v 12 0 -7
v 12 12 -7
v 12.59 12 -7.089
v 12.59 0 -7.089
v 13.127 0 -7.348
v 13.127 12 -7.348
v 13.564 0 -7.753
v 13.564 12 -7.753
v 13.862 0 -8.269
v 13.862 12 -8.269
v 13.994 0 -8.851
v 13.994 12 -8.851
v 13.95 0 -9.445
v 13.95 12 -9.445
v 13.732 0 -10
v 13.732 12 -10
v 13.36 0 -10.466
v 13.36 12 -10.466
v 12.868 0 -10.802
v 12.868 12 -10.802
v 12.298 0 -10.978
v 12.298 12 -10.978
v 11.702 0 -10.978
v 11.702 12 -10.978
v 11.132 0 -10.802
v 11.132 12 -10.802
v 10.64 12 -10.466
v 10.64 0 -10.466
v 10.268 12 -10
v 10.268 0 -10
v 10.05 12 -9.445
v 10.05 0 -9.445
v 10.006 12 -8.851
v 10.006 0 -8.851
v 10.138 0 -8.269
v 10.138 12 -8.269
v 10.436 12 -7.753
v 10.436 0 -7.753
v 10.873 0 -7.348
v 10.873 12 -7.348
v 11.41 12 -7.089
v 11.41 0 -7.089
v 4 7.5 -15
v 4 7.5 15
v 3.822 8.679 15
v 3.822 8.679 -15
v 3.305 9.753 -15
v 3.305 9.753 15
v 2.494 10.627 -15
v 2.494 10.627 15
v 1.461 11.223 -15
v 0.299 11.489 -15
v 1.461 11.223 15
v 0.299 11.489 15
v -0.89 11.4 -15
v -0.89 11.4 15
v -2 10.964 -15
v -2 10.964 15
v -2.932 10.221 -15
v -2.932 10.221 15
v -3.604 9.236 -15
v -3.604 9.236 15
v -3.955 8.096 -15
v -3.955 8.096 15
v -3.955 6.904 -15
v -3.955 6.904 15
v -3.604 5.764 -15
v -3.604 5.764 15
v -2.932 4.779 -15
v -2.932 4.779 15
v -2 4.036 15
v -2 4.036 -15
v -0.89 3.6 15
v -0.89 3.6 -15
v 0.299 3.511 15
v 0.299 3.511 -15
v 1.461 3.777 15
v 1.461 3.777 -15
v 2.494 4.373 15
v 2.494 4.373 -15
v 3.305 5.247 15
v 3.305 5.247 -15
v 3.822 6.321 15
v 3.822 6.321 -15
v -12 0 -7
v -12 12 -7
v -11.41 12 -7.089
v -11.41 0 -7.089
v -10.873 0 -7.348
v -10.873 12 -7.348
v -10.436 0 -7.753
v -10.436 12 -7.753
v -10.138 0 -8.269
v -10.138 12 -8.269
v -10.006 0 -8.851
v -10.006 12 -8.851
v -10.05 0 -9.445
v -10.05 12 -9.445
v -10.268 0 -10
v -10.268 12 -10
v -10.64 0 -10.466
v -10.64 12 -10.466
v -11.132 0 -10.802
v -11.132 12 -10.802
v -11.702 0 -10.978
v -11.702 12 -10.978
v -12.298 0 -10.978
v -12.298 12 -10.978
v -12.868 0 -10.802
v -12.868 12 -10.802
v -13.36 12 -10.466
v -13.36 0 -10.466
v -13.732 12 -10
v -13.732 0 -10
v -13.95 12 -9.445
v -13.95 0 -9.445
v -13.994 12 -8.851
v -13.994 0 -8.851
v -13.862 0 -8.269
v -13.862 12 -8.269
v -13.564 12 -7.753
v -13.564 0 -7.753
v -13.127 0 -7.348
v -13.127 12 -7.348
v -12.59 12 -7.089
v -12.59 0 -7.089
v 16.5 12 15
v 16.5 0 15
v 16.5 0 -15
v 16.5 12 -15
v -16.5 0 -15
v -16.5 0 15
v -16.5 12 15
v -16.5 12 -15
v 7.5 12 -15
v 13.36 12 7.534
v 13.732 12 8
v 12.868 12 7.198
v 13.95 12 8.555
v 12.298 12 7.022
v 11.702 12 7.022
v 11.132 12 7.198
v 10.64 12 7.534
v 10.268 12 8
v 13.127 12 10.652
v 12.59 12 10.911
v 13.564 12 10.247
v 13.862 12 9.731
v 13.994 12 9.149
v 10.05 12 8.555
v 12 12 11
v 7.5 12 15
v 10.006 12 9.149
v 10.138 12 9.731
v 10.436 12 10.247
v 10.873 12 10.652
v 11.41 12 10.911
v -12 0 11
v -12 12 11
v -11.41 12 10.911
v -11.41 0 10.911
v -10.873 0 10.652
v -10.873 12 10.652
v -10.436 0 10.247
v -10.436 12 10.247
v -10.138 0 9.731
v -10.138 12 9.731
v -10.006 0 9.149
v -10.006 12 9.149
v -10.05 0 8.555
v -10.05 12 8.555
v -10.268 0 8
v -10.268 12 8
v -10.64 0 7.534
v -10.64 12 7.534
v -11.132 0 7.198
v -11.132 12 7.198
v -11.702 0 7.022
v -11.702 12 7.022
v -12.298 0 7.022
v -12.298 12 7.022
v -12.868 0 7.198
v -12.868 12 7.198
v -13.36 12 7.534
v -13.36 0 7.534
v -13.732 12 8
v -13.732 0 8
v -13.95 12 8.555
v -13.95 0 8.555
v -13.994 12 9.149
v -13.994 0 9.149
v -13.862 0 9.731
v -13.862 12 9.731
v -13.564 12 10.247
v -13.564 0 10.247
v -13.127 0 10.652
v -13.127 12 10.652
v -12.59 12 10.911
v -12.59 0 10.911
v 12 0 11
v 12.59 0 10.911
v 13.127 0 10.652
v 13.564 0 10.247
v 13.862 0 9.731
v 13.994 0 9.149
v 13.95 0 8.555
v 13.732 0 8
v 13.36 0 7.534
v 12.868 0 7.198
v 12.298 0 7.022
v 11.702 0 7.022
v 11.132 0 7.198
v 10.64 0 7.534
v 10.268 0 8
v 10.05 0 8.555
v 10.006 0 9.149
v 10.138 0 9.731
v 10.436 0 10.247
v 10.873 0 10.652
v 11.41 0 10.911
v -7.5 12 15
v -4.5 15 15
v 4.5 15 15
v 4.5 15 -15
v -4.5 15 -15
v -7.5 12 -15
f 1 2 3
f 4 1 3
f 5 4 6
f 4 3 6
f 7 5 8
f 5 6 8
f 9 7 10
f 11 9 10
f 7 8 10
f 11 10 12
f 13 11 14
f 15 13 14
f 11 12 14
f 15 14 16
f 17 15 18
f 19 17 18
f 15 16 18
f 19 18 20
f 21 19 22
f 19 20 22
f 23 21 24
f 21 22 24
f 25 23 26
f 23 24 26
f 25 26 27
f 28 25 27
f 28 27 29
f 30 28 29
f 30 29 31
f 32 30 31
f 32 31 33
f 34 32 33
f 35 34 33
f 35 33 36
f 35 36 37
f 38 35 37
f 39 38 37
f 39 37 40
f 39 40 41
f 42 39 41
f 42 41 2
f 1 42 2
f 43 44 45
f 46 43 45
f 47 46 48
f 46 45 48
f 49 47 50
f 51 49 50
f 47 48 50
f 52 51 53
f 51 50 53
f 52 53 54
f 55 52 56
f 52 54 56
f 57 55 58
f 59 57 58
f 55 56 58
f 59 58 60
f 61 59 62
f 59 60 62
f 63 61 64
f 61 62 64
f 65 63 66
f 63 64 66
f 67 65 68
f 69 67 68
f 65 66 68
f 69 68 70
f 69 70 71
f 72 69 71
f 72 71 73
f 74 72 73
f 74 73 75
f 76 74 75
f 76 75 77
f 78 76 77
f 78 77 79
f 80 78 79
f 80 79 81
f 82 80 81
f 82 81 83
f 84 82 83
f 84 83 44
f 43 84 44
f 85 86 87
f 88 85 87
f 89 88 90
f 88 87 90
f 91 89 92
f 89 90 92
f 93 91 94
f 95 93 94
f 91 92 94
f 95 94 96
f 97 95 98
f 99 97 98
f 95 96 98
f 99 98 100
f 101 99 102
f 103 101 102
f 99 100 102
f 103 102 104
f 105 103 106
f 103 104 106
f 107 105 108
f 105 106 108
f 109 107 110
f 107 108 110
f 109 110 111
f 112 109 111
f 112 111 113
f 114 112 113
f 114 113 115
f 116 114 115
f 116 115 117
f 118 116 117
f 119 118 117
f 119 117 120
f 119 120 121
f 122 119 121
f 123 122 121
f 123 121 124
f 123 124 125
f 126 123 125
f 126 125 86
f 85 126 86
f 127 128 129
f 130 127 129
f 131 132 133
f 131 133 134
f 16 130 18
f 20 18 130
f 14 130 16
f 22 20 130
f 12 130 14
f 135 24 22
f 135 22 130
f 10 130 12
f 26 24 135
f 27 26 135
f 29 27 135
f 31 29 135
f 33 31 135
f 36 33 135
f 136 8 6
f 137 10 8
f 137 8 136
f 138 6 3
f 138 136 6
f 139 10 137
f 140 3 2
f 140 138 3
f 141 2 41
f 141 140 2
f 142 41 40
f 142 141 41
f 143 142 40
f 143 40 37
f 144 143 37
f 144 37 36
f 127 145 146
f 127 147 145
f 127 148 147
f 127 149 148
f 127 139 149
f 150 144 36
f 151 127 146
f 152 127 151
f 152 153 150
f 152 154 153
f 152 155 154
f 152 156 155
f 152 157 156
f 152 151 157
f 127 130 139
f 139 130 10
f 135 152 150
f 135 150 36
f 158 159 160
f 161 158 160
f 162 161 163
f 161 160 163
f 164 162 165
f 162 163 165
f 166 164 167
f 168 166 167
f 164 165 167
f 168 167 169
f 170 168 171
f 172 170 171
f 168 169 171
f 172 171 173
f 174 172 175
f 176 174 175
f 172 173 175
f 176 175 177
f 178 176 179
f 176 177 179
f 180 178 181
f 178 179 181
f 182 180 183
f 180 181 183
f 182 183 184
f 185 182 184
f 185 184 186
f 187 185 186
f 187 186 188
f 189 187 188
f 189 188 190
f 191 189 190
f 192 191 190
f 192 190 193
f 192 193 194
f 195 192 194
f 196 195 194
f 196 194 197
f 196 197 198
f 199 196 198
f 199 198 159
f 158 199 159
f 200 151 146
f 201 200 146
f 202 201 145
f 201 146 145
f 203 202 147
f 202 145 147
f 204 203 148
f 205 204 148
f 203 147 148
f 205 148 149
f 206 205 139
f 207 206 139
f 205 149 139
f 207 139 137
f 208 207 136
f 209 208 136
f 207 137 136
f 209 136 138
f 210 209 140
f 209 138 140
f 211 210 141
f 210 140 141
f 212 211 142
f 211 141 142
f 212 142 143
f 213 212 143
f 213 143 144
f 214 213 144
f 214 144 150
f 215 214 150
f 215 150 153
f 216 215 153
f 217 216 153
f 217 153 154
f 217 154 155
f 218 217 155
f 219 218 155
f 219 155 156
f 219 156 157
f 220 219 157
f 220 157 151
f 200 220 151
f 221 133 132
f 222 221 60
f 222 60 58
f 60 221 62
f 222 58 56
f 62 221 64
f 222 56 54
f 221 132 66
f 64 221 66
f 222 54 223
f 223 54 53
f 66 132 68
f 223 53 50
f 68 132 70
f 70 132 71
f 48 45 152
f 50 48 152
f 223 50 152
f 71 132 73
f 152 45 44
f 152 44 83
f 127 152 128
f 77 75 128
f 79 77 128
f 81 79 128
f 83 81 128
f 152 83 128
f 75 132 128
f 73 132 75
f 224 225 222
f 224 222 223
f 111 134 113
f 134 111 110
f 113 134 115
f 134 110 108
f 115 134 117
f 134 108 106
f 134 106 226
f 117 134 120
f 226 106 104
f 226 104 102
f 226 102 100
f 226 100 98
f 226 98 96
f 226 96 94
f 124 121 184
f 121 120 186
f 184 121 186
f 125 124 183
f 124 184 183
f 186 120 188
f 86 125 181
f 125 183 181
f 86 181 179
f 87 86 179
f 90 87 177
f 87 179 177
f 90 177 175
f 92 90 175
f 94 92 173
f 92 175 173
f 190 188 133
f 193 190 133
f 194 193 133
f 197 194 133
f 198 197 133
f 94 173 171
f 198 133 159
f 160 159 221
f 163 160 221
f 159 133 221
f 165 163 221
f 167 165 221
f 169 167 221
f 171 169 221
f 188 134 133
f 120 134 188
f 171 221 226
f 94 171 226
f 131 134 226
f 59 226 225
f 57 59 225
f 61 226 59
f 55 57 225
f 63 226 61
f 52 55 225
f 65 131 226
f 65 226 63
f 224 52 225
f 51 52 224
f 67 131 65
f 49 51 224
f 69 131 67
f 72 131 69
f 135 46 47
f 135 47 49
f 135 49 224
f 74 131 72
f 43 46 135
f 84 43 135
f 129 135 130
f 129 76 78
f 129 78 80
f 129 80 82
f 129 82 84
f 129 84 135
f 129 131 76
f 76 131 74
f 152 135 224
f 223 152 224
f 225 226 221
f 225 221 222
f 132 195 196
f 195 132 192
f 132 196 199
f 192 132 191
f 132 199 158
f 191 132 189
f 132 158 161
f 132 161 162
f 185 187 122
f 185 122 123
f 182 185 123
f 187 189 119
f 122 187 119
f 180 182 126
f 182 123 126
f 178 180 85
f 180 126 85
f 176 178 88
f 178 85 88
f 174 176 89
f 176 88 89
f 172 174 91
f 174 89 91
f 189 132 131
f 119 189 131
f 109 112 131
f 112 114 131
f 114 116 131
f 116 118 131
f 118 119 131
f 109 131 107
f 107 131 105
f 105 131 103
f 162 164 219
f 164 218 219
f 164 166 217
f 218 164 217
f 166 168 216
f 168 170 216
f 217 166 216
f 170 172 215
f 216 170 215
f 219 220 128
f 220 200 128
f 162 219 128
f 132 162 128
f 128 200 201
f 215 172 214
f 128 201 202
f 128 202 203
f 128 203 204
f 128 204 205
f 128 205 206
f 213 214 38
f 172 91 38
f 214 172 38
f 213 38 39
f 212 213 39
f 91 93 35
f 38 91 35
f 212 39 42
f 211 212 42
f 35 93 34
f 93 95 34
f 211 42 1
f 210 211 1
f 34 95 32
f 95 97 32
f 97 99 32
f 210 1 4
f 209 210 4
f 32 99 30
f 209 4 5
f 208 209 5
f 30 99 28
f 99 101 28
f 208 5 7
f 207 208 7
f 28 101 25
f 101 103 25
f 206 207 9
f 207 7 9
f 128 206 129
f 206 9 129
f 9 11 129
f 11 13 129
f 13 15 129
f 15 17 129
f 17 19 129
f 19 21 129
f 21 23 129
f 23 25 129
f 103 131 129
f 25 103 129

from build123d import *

# Parameters (mm, degrees)
ESQUISSE1_W             = 33
ESQUISSE1_H             = 30
BOSS_EXTRU_1_DEPTH      = 15
ESQUISSE2_R             = 4
ENL_V_MAT_EXTRU_1_DEPTH = 38.379807383
ENL_V_MAT_EXTRU_2_DEPTH = 38.379807383
ESQUISSE4_R             = 2
ENL_V_MAT_EXTRU_3_DEPTH = 26.322914524


with BuildPart() as part:
    # Esquisse1 → Boss.-Extru.1 (new body)
    with BuildSketch(Plane(origin=(0, 0, 0), x_dir=(1, 0, 0), z_dir=(0, 1, 0))):
        Rectangle(ESQUISSE1_W, ESQUISSE1_H)
    extrude(amount=BOSS_EXTRU_1_DEPTH)

    # Esquisse2 → Enlèv. mat.-Extru.1 (cut, through all)
    with BuildSketch(Plane.XY.offset(15)):
        with Locations((0, 7.5)):
            Circle(ESQUISSE2_R)
    extrude(amount=-ENL_V_MAT_EXTRU_1_DEPTH, mode=Mode.SUBTRACT)

    # Esquisse3 → Enlèv. mat.-Extru.2 (cut, through all)
    with BuildSketch(Plane.XY.offset(15)):
        Polygon((-16.5, 15), (-16.5, 12), (-7.5, 12), (-4.5, 15), align=None)
    enl_v_mat_extru_2 = extrude(amount=-ENL_V_MAT_EXTRU_2_DEPTH, mode=Mode.SUBTRACT)

    # Symétrie1: Enlèv. mat.-Extru.2 across plane
    add(enl_v_mat_extru_2.mirror(Plane(origin=(0, 0, 0), x_dir=(0, 0, 1), z_dir=(1, 0, 0))), mode=Mode.SUBTRACT)

    # Esquisse4 → Enlèv. mat.-Extru.3 (cut, through all)
    with BuildSketch(Plane(origin=(0, 12, 0), x_dir=(1, 0, 0), z_dir=(0, 1, 0))):
        with Locations(Location((-12, 9, 0), (0, 0, 270))):
            Circle(ESQUISSE4_R)
        with Locations(Location((12, 9, 0), (0, 0, 270))):
            Circle(ESQUISSE4_R)
        with Locations(Location((-12, -9, 0), (0, 0, 270))):
            Circle(ESQUISSE4_R)
        with Locations(Location((12, -9, 0), (0, 0, 270))):
            Circle(ESQUISSE4_R)
    extrude(amount=-ENL_V_MAT_EXTRU_3_DEPTH, mode=Mode.SUBTRACT)


solid = part.part
